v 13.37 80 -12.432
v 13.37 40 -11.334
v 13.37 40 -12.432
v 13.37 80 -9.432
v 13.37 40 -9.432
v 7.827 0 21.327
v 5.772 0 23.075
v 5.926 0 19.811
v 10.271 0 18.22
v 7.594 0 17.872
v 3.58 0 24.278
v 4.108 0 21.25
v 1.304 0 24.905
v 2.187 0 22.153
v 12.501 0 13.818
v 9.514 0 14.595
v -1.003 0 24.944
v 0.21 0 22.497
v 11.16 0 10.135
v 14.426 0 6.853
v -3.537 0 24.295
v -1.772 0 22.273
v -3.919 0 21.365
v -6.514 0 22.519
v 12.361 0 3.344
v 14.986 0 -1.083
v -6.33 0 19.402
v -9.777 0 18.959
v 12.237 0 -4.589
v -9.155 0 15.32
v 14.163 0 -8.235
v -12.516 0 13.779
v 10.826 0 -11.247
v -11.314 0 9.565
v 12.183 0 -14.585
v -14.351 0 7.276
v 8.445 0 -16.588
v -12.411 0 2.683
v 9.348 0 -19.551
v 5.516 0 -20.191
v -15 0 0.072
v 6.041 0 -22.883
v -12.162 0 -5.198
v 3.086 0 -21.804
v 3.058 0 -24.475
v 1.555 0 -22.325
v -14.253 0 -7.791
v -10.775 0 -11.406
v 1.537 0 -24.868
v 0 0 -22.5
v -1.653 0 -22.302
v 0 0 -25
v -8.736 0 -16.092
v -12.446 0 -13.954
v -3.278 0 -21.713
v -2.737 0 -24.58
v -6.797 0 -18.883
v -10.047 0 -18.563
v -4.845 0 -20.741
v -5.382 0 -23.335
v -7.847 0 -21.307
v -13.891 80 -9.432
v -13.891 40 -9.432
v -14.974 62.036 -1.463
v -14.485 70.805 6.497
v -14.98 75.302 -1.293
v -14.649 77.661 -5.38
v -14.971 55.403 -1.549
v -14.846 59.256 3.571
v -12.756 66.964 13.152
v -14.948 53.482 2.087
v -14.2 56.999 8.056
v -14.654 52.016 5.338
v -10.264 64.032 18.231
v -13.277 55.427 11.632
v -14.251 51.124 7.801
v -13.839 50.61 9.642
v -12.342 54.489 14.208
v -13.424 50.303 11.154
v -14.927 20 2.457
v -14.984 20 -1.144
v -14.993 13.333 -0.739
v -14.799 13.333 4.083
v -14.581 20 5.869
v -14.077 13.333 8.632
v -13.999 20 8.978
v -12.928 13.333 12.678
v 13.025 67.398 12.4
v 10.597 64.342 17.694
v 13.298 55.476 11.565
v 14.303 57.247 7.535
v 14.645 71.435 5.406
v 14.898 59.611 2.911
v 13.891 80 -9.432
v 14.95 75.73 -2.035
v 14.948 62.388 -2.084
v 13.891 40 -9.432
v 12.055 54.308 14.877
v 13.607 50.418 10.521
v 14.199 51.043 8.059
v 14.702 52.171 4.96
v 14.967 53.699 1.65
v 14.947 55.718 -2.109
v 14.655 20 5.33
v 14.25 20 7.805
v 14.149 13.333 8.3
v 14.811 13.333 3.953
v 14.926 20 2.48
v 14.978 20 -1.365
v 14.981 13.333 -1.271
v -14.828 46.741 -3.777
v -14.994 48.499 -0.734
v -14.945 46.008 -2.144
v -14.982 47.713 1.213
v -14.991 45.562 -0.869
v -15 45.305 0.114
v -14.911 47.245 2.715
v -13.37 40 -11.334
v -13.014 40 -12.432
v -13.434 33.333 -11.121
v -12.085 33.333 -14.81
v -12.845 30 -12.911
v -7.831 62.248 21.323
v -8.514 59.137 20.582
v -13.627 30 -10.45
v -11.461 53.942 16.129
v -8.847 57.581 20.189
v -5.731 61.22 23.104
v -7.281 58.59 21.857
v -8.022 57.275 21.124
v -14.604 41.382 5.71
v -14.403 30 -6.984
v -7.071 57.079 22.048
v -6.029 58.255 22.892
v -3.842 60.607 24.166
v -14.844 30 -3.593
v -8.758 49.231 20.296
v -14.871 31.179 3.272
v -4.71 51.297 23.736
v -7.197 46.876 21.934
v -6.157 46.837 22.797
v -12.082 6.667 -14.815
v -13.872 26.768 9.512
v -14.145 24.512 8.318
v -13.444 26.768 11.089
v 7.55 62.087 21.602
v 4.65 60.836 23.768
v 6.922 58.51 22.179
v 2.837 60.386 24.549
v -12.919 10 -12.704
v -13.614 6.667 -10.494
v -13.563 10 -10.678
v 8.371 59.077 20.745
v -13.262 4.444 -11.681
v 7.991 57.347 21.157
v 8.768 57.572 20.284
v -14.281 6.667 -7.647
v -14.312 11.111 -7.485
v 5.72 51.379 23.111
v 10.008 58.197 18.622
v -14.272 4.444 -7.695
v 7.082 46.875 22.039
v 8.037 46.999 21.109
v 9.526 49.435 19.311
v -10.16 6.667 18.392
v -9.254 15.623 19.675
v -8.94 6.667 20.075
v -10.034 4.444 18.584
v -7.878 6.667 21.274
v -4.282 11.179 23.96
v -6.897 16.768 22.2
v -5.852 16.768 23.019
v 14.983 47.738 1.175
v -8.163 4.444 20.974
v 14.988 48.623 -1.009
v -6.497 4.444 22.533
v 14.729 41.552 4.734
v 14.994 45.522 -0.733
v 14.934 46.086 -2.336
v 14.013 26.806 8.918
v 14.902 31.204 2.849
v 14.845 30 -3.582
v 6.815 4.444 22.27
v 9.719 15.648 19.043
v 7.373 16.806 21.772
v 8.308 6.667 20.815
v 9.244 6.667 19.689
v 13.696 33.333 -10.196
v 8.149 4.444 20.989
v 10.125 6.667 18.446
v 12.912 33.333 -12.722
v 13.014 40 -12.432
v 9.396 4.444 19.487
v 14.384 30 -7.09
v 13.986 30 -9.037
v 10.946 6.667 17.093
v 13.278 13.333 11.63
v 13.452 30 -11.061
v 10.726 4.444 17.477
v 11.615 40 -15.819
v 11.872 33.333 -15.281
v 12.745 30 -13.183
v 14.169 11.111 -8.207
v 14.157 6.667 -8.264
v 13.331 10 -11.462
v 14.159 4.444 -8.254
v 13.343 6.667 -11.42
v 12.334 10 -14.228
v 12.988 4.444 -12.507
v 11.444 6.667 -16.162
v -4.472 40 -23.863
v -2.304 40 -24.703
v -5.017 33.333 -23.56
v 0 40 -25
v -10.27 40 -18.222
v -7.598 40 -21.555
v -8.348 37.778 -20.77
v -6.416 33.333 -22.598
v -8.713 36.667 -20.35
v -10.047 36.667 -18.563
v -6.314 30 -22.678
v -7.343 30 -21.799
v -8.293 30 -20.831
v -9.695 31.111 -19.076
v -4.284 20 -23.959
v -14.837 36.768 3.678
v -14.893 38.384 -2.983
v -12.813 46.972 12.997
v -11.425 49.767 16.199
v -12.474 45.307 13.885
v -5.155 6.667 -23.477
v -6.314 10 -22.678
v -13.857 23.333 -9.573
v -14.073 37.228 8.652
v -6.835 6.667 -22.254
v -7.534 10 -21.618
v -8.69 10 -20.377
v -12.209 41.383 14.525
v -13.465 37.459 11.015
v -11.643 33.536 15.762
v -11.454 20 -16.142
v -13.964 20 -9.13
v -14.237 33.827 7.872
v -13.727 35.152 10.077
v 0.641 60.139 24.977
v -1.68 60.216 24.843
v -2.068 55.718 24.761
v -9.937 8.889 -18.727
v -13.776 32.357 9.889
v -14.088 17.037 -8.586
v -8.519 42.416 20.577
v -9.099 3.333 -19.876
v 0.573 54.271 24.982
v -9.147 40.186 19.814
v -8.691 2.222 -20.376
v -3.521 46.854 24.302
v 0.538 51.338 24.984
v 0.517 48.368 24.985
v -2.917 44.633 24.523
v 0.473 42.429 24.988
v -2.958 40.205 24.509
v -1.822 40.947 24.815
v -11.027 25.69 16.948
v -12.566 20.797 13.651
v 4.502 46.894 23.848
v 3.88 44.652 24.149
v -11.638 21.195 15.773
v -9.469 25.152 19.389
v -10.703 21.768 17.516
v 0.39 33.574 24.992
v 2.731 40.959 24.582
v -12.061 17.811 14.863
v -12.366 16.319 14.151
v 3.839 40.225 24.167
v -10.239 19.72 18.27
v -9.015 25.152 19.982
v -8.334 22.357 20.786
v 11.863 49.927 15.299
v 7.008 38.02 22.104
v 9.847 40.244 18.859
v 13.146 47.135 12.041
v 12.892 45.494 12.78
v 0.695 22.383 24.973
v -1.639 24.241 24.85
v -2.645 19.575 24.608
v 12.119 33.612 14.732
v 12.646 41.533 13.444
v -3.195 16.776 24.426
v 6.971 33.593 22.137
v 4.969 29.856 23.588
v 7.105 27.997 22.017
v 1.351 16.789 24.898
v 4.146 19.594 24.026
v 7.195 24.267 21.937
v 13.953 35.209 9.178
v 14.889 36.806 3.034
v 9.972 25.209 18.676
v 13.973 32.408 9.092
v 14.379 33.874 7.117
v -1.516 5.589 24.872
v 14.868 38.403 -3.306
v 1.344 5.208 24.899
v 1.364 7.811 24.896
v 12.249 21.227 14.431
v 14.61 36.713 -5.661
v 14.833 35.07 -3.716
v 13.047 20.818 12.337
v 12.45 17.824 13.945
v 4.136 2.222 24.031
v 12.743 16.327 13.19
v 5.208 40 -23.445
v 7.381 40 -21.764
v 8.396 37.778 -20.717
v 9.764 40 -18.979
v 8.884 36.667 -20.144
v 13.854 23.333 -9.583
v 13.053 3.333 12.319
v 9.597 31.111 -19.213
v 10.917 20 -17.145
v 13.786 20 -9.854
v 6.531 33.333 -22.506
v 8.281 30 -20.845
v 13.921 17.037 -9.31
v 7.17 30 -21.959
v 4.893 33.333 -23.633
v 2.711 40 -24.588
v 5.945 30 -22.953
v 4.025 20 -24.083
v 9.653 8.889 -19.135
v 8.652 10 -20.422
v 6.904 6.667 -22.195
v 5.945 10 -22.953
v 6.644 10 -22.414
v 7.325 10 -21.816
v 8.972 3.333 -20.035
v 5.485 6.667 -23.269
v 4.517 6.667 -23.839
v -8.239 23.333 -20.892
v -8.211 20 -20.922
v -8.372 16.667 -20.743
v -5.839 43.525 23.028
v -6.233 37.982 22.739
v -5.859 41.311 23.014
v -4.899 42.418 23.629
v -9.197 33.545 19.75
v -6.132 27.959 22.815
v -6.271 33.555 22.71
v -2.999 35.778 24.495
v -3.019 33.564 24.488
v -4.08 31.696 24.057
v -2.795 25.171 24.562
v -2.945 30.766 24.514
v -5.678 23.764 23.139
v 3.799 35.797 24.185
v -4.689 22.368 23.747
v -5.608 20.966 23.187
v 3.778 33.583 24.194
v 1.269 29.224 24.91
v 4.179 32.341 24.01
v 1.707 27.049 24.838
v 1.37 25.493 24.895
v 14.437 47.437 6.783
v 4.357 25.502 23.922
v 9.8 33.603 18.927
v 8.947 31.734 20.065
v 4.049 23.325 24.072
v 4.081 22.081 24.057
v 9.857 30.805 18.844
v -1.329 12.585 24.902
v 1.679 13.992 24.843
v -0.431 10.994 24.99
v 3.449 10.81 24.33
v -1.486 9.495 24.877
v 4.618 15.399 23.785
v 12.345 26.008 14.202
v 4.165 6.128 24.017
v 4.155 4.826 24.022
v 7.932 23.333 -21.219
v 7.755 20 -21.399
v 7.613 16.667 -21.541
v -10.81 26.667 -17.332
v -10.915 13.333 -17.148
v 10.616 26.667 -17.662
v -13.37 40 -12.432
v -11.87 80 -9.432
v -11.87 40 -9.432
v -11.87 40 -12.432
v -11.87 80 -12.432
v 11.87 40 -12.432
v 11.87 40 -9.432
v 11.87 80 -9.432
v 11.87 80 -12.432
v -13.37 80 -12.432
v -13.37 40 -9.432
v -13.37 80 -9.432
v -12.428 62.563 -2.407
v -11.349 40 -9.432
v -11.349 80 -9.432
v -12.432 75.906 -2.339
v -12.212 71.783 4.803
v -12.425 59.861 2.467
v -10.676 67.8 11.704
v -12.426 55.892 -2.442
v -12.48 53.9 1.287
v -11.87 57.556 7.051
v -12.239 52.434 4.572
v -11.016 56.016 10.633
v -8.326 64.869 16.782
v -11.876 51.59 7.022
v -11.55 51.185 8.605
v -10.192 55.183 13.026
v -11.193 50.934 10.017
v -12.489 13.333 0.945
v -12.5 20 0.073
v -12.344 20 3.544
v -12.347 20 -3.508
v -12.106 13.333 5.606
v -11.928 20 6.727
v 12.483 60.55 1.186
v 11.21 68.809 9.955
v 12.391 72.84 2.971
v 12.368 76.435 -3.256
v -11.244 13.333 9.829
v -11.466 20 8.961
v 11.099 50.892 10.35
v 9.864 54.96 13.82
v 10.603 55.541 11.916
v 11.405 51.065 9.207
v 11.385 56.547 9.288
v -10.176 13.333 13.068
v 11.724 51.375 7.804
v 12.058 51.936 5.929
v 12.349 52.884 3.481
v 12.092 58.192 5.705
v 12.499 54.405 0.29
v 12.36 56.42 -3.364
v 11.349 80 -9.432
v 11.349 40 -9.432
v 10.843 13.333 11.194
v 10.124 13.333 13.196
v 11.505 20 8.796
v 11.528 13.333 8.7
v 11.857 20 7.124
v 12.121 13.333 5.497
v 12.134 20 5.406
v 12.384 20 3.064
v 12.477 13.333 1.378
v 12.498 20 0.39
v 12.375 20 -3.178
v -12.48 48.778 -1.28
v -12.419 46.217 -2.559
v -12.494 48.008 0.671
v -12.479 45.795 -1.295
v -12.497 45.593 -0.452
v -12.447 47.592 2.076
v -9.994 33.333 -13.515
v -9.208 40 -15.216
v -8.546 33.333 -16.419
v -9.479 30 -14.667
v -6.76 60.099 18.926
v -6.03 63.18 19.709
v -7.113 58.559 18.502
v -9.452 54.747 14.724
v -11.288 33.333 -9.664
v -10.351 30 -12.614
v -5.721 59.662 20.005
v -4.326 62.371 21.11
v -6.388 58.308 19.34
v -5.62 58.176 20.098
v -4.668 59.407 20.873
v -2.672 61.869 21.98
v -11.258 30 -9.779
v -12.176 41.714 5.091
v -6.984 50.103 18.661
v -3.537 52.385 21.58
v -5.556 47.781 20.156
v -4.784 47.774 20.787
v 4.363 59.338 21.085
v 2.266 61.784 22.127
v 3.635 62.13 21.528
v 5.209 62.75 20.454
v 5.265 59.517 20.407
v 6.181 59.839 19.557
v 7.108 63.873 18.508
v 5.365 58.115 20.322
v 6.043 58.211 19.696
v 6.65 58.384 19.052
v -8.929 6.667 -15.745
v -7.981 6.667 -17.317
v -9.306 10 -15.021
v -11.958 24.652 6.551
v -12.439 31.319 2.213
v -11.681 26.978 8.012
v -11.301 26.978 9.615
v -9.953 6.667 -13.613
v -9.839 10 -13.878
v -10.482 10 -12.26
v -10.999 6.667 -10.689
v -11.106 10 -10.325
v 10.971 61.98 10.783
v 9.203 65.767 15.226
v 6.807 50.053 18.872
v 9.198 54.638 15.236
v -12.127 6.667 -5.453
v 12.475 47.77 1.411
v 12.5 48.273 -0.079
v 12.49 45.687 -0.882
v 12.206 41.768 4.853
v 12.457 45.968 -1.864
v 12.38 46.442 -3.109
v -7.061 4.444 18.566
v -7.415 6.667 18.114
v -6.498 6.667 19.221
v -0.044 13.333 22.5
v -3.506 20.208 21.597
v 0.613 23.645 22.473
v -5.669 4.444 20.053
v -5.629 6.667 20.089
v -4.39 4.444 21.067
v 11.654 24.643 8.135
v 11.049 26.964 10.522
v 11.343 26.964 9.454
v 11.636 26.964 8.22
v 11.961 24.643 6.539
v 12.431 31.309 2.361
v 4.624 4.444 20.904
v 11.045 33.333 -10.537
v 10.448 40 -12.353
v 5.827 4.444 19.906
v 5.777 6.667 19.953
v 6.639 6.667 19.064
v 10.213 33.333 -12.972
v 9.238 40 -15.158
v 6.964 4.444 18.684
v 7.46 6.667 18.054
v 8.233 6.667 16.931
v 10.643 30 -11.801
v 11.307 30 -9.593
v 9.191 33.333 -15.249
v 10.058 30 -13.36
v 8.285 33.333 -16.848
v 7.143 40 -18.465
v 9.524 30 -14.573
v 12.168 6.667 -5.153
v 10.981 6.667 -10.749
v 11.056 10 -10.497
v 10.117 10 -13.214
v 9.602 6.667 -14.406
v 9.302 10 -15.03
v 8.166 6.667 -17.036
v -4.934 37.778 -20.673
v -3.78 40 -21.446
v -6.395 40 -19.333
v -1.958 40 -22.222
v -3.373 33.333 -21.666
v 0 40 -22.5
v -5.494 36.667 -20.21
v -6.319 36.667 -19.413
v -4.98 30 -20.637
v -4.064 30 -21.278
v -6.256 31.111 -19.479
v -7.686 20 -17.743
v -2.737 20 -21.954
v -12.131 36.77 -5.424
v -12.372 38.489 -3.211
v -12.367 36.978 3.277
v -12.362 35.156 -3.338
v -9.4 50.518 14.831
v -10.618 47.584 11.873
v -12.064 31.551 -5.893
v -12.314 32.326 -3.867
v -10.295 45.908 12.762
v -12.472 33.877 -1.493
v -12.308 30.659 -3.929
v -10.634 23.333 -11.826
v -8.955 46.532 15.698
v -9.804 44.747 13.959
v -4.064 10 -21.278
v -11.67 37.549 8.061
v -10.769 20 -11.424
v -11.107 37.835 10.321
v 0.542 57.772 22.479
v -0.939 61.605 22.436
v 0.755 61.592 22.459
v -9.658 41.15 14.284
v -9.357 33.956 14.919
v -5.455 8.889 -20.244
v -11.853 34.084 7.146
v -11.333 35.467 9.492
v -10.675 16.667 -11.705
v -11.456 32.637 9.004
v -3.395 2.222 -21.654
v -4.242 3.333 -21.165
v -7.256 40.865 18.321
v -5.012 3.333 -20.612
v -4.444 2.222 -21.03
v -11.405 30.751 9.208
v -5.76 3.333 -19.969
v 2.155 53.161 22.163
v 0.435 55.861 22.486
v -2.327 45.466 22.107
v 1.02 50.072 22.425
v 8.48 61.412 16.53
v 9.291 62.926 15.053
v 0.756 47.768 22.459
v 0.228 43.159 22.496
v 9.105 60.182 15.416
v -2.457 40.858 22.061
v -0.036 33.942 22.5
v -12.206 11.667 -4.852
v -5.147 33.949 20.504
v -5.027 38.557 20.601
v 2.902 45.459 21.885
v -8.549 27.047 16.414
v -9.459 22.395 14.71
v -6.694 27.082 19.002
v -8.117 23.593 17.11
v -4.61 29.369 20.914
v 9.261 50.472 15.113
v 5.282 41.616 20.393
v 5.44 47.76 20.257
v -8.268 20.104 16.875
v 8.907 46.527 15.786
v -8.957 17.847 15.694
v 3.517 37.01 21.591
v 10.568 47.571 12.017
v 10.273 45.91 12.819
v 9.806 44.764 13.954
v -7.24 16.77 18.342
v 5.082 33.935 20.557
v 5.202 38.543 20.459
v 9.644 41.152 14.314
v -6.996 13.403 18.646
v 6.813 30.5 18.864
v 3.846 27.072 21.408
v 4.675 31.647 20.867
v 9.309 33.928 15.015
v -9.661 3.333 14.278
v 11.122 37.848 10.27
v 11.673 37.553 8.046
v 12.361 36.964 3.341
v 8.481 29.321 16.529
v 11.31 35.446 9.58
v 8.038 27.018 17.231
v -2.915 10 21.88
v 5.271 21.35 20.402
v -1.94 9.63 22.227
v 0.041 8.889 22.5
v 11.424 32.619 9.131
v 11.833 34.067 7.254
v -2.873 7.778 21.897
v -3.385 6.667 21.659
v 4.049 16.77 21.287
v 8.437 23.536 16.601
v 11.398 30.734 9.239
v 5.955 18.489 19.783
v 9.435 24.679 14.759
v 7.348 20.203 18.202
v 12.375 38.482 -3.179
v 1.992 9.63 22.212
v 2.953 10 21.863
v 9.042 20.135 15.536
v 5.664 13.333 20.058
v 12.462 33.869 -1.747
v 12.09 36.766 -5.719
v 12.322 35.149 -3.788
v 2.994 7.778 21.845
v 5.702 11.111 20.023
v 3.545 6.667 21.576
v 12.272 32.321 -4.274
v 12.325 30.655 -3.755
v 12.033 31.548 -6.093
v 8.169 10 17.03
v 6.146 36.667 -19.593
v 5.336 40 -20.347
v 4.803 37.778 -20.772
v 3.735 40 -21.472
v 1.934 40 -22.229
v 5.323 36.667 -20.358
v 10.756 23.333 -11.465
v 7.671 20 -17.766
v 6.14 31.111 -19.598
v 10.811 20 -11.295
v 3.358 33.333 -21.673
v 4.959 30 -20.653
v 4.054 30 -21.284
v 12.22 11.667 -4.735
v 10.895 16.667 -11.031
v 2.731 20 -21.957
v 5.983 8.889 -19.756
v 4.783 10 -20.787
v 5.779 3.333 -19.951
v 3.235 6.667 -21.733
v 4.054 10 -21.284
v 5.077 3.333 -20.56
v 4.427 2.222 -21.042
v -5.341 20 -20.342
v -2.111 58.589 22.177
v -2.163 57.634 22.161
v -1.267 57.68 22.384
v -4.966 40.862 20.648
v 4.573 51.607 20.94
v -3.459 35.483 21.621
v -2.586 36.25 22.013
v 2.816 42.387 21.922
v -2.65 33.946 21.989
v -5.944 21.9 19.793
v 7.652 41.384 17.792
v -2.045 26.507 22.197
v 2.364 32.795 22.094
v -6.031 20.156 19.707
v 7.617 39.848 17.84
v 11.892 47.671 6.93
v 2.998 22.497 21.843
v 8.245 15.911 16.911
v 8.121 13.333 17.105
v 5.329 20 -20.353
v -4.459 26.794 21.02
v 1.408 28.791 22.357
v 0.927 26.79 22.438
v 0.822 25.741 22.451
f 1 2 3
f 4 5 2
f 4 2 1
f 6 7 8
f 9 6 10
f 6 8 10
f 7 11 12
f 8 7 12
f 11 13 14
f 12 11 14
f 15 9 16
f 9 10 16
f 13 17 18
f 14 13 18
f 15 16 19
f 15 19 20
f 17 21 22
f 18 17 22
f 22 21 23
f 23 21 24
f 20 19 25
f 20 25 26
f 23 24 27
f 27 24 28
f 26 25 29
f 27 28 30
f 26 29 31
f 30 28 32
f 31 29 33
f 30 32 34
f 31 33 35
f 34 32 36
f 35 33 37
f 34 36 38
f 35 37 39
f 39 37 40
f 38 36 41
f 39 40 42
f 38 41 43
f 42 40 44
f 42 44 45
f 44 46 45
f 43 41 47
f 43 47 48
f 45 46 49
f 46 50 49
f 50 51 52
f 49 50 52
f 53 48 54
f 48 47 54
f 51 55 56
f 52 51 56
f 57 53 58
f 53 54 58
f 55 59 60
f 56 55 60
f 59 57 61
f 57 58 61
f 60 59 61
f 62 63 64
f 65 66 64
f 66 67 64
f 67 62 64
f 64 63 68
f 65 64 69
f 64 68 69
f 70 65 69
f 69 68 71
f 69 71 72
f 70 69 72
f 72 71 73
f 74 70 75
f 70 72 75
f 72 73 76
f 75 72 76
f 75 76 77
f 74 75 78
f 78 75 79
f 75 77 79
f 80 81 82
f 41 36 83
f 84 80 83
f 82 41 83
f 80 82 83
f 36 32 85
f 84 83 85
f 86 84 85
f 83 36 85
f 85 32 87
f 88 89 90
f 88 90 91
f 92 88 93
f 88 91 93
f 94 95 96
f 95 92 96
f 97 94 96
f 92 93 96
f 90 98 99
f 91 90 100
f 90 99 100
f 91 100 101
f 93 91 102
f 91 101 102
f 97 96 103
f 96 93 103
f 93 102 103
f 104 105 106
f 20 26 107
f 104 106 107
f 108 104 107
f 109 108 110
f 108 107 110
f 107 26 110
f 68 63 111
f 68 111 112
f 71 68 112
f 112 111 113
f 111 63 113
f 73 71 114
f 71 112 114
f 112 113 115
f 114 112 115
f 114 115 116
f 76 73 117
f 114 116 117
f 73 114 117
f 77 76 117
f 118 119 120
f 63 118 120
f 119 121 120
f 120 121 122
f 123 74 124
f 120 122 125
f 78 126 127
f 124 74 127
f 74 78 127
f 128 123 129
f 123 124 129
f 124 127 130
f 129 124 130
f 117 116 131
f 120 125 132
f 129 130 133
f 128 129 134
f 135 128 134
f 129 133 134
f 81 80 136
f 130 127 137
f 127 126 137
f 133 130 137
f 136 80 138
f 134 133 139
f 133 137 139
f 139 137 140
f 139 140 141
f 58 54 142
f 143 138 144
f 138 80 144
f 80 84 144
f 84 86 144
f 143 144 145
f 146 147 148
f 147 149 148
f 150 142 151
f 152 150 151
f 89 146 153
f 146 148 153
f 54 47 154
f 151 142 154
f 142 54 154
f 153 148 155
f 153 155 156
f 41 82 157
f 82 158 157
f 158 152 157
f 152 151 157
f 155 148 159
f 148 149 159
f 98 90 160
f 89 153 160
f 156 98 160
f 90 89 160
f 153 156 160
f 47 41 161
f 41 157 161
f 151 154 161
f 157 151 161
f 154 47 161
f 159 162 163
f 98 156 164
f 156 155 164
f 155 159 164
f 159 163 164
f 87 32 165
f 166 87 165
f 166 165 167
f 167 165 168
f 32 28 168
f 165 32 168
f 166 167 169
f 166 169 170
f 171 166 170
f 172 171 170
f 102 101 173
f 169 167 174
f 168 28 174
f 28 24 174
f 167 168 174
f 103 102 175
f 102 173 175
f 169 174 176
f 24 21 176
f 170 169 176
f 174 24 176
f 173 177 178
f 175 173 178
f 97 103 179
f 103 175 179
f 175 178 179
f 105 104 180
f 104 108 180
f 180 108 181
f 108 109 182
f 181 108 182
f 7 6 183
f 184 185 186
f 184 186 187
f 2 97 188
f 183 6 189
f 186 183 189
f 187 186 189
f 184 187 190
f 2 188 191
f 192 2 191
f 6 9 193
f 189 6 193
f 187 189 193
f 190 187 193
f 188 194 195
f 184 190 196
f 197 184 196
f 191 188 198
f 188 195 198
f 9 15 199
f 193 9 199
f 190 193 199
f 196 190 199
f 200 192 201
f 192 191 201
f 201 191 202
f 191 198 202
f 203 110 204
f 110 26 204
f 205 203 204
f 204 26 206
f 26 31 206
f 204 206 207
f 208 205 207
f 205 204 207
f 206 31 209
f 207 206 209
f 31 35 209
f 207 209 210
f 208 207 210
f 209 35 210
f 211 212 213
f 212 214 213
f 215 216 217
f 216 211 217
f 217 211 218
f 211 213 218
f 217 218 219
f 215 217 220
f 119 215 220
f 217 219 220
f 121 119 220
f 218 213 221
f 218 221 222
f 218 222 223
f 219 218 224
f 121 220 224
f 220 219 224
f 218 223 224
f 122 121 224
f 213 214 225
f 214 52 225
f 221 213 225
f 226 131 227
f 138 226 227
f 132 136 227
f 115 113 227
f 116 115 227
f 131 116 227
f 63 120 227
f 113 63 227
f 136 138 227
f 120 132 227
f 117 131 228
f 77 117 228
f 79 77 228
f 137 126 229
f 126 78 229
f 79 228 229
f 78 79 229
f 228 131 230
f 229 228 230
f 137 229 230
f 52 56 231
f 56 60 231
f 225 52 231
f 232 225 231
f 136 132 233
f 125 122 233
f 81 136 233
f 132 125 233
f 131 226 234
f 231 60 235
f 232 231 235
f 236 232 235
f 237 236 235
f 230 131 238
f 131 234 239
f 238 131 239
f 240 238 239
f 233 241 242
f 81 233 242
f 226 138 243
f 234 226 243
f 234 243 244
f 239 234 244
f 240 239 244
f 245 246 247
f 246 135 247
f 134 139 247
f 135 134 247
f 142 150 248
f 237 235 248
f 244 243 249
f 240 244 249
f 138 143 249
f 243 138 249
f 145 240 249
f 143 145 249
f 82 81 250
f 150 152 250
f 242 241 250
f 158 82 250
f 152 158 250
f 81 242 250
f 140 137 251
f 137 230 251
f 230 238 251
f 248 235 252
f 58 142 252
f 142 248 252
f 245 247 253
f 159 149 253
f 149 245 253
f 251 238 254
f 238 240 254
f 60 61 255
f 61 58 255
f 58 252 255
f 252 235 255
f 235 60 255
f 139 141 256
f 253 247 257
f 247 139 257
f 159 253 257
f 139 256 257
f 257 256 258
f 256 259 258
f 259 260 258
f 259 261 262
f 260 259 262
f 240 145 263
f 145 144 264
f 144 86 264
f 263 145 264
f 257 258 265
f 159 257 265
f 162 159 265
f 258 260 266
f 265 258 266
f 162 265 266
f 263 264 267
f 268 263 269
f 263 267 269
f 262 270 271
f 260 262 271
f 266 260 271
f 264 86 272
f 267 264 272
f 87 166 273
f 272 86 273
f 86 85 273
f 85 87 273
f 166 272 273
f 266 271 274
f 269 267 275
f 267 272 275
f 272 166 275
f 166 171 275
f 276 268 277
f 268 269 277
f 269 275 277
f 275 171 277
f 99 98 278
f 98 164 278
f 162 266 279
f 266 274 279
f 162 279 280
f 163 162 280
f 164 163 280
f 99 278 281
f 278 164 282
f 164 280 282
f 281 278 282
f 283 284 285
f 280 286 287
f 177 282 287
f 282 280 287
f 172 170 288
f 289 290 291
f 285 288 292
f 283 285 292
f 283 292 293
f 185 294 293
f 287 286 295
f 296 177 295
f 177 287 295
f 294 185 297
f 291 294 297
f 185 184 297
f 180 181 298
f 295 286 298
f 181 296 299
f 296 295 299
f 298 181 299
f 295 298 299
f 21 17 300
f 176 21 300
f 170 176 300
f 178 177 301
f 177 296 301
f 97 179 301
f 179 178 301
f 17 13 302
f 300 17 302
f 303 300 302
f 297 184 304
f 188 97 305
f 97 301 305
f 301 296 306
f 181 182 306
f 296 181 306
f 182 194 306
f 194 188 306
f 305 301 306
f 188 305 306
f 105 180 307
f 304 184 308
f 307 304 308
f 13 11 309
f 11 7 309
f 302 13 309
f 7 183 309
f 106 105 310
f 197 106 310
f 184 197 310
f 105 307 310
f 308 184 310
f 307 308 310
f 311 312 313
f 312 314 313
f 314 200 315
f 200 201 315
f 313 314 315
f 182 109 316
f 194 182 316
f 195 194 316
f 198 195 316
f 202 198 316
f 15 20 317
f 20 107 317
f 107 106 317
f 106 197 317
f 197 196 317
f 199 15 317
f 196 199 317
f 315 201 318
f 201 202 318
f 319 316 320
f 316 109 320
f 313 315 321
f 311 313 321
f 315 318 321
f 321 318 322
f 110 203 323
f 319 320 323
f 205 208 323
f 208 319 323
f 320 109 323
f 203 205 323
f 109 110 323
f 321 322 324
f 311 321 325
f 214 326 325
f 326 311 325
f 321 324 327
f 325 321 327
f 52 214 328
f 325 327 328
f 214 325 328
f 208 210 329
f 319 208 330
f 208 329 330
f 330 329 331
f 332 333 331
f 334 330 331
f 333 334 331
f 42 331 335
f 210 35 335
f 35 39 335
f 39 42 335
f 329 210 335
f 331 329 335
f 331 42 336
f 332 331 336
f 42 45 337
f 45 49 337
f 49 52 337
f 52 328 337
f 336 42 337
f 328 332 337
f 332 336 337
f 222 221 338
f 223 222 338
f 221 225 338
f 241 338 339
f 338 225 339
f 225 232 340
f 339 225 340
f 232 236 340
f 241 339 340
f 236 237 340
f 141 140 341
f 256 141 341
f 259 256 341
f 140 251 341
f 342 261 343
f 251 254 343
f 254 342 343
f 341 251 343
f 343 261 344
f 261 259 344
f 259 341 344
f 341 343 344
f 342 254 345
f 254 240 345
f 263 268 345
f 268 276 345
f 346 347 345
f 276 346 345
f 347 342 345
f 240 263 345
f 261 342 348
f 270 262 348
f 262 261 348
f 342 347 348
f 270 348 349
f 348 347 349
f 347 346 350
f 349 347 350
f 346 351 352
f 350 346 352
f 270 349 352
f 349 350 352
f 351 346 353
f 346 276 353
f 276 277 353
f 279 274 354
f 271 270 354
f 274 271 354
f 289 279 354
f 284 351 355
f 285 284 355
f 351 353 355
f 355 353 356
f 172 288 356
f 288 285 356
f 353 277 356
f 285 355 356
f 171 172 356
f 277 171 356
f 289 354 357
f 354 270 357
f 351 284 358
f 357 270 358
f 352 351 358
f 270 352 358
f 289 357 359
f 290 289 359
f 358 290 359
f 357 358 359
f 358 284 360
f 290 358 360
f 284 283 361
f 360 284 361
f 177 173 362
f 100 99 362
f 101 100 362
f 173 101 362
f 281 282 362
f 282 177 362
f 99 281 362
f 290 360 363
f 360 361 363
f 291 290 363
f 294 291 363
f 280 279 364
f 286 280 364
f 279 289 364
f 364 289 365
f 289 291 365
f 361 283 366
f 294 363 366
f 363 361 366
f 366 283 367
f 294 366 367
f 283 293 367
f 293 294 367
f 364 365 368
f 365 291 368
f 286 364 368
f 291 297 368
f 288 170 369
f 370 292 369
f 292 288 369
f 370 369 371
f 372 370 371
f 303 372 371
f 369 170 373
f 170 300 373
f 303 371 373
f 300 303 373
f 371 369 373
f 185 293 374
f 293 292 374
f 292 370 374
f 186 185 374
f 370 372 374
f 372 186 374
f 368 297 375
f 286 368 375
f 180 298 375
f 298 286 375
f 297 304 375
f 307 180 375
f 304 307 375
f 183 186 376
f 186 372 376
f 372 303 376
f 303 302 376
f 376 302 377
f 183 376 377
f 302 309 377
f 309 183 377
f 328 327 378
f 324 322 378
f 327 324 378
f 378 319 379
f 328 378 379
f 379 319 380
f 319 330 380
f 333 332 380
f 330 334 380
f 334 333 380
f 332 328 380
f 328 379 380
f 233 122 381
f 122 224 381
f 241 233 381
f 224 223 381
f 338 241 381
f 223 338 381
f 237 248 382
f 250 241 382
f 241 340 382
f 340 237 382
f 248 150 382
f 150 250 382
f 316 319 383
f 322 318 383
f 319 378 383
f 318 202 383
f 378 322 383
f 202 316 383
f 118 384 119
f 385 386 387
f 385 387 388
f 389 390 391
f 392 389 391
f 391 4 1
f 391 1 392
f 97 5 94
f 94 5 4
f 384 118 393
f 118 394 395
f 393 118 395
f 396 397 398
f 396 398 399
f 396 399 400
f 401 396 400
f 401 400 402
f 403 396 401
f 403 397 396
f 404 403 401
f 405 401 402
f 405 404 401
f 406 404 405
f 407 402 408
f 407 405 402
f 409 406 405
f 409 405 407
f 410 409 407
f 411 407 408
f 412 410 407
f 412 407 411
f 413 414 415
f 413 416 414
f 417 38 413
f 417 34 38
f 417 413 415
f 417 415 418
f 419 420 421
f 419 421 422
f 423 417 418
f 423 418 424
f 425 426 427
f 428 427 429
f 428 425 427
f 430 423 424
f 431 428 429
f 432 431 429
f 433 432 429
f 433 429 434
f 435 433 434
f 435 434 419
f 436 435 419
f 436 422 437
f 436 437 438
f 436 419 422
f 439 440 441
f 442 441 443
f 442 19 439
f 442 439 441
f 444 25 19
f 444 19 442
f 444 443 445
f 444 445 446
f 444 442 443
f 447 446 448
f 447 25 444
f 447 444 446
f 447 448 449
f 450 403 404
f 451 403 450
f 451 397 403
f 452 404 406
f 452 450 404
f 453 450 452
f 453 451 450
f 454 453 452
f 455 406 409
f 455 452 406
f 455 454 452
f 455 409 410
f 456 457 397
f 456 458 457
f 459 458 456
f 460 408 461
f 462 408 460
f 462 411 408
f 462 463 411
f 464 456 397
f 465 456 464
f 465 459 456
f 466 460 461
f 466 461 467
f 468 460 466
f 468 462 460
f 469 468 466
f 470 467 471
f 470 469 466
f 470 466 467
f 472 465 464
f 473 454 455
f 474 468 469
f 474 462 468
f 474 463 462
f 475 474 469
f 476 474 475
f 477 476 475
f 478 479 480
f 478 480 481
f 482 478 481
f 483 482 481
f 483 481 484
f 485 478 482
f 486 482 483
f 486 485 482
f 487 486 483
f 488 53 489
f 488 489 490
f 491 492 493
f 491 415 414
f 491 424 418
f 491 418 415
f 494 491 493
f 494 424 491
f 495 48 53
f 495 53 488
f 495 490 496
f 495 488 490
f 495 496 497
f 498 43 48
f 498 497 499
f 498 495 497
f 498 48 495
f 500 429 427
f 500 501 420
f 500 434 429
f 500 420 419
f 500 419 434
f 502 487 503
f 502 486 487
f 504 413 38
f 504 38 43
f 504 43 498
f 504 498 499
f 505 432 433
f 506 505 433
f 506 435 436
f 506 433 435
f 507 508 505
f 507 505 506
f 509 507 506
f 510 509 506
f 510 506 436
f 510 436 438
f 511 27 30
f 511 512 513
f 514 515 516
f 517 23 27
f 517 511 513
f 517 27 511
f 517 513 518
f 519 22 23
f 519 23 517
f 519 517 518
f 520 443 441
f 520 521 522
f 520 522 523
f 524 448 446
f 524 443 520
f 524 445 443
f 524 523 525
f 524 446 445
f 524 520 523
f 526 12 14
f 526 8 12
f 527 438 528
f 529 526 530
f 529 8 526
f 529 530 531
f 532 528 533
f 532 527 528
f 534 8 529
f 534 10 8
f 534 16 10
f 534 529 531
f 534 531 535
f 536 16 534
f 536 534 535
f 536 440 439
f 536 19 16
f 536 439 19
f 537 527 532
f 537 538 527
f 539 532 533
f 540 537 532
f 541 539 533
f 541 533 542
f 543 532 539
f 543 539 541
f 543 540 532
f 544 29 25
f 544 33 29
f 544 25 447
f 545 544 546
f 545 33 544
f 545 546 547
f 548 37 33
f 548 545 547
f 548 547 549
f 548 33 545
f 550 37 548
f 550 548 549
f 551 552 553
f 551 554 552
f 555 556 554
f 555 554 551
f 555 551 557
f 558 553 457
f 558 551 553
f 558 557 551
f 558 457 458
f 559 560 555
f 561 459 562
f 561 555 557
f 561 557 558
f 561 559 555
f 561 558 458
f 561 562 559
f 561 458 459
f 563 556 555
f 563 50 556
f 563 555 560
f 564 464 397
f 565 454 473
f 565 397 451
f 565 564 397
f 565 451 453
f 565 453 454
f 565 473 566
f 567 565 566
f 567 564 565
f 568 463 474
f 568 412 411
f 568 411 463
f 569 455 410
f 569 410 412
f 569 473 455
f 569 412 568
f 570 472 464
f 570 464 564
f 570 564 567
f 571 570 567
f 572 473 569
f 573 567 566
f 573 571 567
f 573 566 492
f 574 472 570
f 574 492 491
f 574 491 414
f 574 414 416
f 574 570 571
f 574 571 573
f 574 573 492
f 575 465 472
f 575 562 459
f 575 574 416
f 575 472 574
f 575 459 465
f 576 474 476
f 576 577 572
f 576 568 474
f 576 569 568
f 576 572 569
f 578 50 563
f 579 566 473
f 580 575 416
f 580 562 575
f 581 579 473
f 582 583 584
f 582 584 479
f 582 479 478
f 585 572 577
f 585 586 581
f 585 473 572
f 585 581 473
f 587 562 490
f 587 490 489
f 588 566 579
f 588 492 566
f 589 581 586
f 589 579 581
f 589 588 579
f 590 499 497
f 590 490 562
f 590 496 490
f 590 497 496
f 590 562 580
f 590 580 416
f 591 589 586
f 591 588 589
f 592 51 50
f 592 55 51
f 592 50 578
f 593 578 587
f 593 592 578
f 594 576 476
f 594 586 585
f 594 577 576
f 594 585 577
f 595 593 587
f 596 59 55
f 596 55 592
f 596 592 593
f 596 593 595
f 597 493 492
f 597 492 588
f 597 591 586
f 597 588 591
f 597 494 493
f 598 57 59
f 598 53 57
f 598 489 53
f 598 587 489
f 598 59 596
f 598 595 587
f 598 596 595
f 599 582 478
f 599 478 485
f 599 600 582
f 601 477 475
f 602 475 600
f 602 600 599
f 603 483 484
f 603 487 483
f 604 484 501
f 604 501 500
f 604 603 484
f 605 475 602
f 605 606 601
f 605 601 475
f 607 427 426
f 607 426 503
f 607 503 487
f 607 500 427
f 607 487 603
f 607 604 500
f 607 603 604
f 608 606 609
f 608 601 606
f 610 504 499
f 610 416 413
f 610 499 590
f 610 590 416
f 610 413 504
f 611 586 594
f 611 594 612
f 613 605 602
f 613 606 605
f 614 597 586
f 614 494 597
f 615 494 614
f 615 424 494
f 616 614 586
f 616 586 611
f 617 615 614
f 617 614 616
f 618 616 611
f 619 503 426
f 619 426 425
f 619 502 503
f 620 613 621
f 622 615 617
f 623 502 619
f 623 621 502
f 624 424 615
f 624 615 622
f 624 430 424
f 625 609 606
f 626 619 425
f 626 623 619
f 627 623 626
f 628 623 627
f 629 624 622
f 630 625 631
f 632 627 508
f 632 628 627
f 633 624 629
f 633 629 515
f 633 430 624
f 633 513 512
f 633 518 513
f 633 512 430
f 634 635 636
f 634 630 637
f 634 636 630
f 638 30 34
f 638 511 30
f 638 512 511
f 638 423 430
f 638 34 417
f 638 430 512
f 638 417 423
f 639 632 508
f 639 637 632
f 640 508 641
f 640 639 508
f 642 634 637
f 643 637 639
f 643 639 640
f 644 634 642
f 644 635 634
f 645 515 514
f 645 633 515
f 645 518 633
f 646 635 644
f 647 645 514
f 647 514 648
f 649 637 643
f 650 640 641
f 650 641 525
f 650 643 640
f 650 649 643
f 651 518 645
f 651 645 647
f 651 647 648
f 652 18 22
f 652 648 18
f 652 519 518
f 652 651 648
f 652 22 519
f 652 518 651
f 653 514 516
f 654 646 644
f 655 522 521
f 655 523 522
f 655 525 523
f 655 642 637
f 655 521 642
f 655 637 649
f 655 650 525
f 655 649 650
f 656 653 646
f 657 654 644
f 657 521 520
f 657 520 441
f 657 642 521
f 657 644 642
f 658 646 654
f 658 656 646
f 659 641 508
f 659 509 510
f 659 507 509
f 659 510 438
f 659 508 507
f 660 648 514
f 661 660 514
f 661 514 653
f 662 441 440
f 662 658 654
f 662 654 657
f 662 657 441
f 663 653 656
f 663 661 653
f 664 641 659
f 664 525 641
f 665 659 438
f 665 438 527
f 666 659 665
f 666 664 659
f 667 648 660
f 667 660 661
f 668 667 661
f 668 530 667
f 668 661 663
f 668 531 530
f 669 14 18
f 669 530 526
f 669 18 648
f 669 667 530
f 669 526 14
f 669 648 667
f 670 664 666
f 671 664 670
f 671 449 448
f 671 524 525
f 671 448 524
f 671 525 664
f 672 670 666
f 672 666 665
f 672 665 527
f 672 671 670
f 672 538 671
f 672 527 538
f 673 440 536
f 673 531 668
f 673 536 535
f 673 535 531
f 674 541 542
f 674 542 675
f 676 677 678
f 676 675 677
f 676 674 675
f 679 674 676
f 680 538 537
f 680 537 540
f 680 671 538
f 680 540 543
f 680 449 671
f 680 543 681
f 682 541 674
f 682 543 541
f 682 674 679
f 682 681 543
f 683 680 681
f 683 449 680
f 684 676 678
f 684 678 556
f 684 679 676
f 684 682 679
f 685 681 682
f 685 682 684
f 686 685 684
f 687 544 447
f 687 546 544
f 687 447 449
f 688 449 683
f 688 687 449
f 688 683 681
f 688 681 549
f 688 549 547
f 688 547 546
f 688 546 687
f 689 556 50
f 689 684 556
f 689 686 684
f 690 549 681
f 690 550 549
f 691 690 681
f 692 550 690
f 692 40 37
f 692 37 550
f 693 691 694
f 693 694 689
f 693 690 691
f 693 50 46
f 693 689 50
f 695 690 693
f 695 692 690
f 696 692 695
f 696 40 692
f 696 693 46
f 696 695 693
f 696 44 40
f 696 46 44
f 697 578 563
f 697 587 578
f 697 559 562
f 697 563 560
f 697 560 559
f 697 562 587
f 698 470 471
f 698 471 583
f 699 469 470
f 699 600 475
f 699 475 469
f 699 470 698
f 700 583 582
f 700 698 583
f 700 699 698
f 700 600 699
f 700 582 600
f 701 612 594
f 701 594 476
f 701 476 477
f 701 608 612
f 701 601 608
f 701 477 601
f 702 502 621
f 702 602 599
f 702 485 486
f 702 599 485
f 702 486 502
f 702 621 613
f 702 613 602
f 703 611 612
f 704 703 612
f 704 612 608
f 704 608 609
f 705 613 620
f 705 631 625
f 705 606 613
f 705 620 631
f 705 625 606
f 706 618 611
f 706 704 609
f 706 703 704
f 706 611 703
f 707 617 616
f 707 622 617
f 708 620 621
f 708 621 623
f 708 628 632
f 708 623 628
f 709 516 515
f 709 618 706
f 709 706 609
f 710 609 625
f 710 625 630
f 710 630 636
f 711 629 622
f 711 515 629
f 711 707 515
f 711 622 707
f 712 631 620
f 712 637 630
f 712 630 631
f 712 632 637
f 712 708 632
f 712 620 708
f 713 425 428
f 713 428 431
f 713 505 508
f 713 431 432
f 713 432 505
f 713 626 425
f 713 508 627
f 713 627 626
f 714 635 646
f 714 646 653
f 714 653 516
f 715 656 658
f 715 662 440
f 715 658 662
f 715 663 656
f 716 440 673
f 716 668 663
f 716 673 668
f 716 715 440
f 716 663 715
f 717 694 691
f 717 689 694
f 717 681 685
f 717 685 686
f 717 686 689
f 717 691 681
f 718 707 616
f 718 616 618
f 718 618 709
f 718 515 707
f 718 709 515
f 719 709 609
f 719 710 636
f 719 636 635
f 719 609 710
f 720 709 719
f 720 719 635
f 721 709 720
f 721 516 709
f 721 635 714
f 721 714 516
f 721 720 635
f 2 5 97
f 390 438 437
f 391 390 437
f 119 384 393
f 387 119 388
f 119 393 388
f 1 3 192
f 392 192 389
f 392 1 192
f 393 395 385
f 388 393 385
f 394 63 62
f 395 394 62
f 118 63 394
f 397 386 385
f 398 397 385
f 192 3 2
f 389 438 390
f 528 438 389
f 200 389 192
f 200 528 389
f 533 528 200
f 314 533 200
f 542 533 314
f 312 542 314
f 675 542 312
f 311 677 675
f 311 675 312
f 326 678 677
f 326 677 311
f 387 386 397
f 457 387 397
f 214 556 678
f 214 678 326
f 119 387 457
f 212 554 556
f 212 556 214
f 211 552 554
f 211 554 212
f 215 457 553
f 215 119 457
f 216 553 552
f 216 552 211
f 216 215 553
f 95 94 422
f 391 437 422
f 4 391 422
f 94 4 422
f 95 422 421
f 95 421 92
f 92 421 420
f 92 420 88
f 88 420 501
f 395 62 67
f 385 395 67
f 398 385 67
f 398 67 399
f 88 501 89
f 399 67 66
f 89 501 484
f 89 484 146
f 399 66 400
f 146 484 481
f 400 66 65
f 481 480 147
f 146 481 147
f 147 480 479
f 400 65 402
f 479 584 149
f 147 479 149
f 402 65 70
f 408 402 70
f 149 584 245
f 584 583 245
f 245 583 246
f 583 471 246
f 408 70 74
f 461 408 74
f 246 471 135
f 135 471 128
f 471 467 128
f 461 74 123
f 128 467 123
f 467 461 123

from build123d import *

# Parameters (mm, degrees)
SKETCH1_RX              = 25
SKETCH1_RY              = 15
SKETCH1_RX_2            = 22.5
SKETCH1_RY_2            = 12.5
BOSS_EXTRUDE1_DEPTH     = 80
CUT_EXTRUDE1_DEPTH      = 86.14693183
CUT_EXTRUDE1_DEPTH_BACK = 86.14693183
CUT_EXTRUDE2_DEPTH      = 86.146931971
CUT_EXTRUDE2_DEPTH_BACK = 86.146931971
SKETCH6_W               = 15.567596141
SKETCH6_H               = 40
SKETCH10_W              = 1.5
SKETCH10_H              = 40
BOSS_EXTRUDE2_DEPTH     = 3


with BuildPart() as part:
    # Sketch1 → Boss-Extrude1 (new body)
    with BuildSketch(Plane(origin=(0, 0, 0), x_dir=(1, 0, 0), z_dir=(0, 1, 0))):
        with Locations(Location((0, 0), (0, 0, 90))):
            Ellipse(SKETCH1_RX, SKETCH1_RY)
        with Locations(Location((0, 0), (0, 0, 90))):
            Ellipse(SKETCH1_RX_2, SKETCH1_RY_2, mode=Mode.SUBTRACT)
    extrude(amount=BOSS_EXTRUDE1_DEPTH)

    # Sketch5 → Cut-Extrude1 (cut, two sides: drawn at the far end of the back side and taken through both)
    with BuildSketch(Plane(origin=(0, 0, 0), x_dir=(0, 0, -1), z_dir=(1, 0, 0)).offset(-CUT_EXTRUDE1_DEPTH_BACK)):
        Polygon((9.432403859, 80), (-25, 60.125468033), (-25, 80), align=None)
    extrude(amount=CUT_EXTRUDE1_DEPTH + CUT_EXTRUDE1_DEPTH_BACK, mode=Mode.SUBTRACT)

    # Sketch6 → Cut-Extrude2 (cut, two sides: drawn at the far end of the back side and taken through both)
    with BuildSketch(Plane(origin=(0, 0, 0), x_dir=(0, 0, -1), z_dir=(1, 0, 0)).offset(-CUT_EXTRUDE2_DEPTH_BACK)):
        with Locations((17.21620193, 60)):
            Rectangle(SKETCH6_W, SKETCH6_H)
    extrude(amount=CUT_EXTRUDE2_DEPTH + CUT_EXTRUDE2_DEPTH_BACK, mode=Mode.SUBTRACT)

    # Sketch10 → Boss-Extrude2 (add)
    with BuildSketch(Plane(origin=(0, 0, -9.432403859), x_dir=(-1, 0, 0), z_dir=(0, 0, -1))):
        with Locations((-12.619980104, 60)):
            Rectangle(SKETCH10_W, SKETCH10_H)
    boss_extrude2 = extrude(amount=BOSS_EXTRUDE2_DEPTH)

    # Mirror1: Boss-Extrude2 across plane
    add(boss_extrude2.mirror(Plane(origin=(0, 0, 0), x_dir=(0, 0, 1), z_dir=(1, 0, 0))))


solid = part.part
